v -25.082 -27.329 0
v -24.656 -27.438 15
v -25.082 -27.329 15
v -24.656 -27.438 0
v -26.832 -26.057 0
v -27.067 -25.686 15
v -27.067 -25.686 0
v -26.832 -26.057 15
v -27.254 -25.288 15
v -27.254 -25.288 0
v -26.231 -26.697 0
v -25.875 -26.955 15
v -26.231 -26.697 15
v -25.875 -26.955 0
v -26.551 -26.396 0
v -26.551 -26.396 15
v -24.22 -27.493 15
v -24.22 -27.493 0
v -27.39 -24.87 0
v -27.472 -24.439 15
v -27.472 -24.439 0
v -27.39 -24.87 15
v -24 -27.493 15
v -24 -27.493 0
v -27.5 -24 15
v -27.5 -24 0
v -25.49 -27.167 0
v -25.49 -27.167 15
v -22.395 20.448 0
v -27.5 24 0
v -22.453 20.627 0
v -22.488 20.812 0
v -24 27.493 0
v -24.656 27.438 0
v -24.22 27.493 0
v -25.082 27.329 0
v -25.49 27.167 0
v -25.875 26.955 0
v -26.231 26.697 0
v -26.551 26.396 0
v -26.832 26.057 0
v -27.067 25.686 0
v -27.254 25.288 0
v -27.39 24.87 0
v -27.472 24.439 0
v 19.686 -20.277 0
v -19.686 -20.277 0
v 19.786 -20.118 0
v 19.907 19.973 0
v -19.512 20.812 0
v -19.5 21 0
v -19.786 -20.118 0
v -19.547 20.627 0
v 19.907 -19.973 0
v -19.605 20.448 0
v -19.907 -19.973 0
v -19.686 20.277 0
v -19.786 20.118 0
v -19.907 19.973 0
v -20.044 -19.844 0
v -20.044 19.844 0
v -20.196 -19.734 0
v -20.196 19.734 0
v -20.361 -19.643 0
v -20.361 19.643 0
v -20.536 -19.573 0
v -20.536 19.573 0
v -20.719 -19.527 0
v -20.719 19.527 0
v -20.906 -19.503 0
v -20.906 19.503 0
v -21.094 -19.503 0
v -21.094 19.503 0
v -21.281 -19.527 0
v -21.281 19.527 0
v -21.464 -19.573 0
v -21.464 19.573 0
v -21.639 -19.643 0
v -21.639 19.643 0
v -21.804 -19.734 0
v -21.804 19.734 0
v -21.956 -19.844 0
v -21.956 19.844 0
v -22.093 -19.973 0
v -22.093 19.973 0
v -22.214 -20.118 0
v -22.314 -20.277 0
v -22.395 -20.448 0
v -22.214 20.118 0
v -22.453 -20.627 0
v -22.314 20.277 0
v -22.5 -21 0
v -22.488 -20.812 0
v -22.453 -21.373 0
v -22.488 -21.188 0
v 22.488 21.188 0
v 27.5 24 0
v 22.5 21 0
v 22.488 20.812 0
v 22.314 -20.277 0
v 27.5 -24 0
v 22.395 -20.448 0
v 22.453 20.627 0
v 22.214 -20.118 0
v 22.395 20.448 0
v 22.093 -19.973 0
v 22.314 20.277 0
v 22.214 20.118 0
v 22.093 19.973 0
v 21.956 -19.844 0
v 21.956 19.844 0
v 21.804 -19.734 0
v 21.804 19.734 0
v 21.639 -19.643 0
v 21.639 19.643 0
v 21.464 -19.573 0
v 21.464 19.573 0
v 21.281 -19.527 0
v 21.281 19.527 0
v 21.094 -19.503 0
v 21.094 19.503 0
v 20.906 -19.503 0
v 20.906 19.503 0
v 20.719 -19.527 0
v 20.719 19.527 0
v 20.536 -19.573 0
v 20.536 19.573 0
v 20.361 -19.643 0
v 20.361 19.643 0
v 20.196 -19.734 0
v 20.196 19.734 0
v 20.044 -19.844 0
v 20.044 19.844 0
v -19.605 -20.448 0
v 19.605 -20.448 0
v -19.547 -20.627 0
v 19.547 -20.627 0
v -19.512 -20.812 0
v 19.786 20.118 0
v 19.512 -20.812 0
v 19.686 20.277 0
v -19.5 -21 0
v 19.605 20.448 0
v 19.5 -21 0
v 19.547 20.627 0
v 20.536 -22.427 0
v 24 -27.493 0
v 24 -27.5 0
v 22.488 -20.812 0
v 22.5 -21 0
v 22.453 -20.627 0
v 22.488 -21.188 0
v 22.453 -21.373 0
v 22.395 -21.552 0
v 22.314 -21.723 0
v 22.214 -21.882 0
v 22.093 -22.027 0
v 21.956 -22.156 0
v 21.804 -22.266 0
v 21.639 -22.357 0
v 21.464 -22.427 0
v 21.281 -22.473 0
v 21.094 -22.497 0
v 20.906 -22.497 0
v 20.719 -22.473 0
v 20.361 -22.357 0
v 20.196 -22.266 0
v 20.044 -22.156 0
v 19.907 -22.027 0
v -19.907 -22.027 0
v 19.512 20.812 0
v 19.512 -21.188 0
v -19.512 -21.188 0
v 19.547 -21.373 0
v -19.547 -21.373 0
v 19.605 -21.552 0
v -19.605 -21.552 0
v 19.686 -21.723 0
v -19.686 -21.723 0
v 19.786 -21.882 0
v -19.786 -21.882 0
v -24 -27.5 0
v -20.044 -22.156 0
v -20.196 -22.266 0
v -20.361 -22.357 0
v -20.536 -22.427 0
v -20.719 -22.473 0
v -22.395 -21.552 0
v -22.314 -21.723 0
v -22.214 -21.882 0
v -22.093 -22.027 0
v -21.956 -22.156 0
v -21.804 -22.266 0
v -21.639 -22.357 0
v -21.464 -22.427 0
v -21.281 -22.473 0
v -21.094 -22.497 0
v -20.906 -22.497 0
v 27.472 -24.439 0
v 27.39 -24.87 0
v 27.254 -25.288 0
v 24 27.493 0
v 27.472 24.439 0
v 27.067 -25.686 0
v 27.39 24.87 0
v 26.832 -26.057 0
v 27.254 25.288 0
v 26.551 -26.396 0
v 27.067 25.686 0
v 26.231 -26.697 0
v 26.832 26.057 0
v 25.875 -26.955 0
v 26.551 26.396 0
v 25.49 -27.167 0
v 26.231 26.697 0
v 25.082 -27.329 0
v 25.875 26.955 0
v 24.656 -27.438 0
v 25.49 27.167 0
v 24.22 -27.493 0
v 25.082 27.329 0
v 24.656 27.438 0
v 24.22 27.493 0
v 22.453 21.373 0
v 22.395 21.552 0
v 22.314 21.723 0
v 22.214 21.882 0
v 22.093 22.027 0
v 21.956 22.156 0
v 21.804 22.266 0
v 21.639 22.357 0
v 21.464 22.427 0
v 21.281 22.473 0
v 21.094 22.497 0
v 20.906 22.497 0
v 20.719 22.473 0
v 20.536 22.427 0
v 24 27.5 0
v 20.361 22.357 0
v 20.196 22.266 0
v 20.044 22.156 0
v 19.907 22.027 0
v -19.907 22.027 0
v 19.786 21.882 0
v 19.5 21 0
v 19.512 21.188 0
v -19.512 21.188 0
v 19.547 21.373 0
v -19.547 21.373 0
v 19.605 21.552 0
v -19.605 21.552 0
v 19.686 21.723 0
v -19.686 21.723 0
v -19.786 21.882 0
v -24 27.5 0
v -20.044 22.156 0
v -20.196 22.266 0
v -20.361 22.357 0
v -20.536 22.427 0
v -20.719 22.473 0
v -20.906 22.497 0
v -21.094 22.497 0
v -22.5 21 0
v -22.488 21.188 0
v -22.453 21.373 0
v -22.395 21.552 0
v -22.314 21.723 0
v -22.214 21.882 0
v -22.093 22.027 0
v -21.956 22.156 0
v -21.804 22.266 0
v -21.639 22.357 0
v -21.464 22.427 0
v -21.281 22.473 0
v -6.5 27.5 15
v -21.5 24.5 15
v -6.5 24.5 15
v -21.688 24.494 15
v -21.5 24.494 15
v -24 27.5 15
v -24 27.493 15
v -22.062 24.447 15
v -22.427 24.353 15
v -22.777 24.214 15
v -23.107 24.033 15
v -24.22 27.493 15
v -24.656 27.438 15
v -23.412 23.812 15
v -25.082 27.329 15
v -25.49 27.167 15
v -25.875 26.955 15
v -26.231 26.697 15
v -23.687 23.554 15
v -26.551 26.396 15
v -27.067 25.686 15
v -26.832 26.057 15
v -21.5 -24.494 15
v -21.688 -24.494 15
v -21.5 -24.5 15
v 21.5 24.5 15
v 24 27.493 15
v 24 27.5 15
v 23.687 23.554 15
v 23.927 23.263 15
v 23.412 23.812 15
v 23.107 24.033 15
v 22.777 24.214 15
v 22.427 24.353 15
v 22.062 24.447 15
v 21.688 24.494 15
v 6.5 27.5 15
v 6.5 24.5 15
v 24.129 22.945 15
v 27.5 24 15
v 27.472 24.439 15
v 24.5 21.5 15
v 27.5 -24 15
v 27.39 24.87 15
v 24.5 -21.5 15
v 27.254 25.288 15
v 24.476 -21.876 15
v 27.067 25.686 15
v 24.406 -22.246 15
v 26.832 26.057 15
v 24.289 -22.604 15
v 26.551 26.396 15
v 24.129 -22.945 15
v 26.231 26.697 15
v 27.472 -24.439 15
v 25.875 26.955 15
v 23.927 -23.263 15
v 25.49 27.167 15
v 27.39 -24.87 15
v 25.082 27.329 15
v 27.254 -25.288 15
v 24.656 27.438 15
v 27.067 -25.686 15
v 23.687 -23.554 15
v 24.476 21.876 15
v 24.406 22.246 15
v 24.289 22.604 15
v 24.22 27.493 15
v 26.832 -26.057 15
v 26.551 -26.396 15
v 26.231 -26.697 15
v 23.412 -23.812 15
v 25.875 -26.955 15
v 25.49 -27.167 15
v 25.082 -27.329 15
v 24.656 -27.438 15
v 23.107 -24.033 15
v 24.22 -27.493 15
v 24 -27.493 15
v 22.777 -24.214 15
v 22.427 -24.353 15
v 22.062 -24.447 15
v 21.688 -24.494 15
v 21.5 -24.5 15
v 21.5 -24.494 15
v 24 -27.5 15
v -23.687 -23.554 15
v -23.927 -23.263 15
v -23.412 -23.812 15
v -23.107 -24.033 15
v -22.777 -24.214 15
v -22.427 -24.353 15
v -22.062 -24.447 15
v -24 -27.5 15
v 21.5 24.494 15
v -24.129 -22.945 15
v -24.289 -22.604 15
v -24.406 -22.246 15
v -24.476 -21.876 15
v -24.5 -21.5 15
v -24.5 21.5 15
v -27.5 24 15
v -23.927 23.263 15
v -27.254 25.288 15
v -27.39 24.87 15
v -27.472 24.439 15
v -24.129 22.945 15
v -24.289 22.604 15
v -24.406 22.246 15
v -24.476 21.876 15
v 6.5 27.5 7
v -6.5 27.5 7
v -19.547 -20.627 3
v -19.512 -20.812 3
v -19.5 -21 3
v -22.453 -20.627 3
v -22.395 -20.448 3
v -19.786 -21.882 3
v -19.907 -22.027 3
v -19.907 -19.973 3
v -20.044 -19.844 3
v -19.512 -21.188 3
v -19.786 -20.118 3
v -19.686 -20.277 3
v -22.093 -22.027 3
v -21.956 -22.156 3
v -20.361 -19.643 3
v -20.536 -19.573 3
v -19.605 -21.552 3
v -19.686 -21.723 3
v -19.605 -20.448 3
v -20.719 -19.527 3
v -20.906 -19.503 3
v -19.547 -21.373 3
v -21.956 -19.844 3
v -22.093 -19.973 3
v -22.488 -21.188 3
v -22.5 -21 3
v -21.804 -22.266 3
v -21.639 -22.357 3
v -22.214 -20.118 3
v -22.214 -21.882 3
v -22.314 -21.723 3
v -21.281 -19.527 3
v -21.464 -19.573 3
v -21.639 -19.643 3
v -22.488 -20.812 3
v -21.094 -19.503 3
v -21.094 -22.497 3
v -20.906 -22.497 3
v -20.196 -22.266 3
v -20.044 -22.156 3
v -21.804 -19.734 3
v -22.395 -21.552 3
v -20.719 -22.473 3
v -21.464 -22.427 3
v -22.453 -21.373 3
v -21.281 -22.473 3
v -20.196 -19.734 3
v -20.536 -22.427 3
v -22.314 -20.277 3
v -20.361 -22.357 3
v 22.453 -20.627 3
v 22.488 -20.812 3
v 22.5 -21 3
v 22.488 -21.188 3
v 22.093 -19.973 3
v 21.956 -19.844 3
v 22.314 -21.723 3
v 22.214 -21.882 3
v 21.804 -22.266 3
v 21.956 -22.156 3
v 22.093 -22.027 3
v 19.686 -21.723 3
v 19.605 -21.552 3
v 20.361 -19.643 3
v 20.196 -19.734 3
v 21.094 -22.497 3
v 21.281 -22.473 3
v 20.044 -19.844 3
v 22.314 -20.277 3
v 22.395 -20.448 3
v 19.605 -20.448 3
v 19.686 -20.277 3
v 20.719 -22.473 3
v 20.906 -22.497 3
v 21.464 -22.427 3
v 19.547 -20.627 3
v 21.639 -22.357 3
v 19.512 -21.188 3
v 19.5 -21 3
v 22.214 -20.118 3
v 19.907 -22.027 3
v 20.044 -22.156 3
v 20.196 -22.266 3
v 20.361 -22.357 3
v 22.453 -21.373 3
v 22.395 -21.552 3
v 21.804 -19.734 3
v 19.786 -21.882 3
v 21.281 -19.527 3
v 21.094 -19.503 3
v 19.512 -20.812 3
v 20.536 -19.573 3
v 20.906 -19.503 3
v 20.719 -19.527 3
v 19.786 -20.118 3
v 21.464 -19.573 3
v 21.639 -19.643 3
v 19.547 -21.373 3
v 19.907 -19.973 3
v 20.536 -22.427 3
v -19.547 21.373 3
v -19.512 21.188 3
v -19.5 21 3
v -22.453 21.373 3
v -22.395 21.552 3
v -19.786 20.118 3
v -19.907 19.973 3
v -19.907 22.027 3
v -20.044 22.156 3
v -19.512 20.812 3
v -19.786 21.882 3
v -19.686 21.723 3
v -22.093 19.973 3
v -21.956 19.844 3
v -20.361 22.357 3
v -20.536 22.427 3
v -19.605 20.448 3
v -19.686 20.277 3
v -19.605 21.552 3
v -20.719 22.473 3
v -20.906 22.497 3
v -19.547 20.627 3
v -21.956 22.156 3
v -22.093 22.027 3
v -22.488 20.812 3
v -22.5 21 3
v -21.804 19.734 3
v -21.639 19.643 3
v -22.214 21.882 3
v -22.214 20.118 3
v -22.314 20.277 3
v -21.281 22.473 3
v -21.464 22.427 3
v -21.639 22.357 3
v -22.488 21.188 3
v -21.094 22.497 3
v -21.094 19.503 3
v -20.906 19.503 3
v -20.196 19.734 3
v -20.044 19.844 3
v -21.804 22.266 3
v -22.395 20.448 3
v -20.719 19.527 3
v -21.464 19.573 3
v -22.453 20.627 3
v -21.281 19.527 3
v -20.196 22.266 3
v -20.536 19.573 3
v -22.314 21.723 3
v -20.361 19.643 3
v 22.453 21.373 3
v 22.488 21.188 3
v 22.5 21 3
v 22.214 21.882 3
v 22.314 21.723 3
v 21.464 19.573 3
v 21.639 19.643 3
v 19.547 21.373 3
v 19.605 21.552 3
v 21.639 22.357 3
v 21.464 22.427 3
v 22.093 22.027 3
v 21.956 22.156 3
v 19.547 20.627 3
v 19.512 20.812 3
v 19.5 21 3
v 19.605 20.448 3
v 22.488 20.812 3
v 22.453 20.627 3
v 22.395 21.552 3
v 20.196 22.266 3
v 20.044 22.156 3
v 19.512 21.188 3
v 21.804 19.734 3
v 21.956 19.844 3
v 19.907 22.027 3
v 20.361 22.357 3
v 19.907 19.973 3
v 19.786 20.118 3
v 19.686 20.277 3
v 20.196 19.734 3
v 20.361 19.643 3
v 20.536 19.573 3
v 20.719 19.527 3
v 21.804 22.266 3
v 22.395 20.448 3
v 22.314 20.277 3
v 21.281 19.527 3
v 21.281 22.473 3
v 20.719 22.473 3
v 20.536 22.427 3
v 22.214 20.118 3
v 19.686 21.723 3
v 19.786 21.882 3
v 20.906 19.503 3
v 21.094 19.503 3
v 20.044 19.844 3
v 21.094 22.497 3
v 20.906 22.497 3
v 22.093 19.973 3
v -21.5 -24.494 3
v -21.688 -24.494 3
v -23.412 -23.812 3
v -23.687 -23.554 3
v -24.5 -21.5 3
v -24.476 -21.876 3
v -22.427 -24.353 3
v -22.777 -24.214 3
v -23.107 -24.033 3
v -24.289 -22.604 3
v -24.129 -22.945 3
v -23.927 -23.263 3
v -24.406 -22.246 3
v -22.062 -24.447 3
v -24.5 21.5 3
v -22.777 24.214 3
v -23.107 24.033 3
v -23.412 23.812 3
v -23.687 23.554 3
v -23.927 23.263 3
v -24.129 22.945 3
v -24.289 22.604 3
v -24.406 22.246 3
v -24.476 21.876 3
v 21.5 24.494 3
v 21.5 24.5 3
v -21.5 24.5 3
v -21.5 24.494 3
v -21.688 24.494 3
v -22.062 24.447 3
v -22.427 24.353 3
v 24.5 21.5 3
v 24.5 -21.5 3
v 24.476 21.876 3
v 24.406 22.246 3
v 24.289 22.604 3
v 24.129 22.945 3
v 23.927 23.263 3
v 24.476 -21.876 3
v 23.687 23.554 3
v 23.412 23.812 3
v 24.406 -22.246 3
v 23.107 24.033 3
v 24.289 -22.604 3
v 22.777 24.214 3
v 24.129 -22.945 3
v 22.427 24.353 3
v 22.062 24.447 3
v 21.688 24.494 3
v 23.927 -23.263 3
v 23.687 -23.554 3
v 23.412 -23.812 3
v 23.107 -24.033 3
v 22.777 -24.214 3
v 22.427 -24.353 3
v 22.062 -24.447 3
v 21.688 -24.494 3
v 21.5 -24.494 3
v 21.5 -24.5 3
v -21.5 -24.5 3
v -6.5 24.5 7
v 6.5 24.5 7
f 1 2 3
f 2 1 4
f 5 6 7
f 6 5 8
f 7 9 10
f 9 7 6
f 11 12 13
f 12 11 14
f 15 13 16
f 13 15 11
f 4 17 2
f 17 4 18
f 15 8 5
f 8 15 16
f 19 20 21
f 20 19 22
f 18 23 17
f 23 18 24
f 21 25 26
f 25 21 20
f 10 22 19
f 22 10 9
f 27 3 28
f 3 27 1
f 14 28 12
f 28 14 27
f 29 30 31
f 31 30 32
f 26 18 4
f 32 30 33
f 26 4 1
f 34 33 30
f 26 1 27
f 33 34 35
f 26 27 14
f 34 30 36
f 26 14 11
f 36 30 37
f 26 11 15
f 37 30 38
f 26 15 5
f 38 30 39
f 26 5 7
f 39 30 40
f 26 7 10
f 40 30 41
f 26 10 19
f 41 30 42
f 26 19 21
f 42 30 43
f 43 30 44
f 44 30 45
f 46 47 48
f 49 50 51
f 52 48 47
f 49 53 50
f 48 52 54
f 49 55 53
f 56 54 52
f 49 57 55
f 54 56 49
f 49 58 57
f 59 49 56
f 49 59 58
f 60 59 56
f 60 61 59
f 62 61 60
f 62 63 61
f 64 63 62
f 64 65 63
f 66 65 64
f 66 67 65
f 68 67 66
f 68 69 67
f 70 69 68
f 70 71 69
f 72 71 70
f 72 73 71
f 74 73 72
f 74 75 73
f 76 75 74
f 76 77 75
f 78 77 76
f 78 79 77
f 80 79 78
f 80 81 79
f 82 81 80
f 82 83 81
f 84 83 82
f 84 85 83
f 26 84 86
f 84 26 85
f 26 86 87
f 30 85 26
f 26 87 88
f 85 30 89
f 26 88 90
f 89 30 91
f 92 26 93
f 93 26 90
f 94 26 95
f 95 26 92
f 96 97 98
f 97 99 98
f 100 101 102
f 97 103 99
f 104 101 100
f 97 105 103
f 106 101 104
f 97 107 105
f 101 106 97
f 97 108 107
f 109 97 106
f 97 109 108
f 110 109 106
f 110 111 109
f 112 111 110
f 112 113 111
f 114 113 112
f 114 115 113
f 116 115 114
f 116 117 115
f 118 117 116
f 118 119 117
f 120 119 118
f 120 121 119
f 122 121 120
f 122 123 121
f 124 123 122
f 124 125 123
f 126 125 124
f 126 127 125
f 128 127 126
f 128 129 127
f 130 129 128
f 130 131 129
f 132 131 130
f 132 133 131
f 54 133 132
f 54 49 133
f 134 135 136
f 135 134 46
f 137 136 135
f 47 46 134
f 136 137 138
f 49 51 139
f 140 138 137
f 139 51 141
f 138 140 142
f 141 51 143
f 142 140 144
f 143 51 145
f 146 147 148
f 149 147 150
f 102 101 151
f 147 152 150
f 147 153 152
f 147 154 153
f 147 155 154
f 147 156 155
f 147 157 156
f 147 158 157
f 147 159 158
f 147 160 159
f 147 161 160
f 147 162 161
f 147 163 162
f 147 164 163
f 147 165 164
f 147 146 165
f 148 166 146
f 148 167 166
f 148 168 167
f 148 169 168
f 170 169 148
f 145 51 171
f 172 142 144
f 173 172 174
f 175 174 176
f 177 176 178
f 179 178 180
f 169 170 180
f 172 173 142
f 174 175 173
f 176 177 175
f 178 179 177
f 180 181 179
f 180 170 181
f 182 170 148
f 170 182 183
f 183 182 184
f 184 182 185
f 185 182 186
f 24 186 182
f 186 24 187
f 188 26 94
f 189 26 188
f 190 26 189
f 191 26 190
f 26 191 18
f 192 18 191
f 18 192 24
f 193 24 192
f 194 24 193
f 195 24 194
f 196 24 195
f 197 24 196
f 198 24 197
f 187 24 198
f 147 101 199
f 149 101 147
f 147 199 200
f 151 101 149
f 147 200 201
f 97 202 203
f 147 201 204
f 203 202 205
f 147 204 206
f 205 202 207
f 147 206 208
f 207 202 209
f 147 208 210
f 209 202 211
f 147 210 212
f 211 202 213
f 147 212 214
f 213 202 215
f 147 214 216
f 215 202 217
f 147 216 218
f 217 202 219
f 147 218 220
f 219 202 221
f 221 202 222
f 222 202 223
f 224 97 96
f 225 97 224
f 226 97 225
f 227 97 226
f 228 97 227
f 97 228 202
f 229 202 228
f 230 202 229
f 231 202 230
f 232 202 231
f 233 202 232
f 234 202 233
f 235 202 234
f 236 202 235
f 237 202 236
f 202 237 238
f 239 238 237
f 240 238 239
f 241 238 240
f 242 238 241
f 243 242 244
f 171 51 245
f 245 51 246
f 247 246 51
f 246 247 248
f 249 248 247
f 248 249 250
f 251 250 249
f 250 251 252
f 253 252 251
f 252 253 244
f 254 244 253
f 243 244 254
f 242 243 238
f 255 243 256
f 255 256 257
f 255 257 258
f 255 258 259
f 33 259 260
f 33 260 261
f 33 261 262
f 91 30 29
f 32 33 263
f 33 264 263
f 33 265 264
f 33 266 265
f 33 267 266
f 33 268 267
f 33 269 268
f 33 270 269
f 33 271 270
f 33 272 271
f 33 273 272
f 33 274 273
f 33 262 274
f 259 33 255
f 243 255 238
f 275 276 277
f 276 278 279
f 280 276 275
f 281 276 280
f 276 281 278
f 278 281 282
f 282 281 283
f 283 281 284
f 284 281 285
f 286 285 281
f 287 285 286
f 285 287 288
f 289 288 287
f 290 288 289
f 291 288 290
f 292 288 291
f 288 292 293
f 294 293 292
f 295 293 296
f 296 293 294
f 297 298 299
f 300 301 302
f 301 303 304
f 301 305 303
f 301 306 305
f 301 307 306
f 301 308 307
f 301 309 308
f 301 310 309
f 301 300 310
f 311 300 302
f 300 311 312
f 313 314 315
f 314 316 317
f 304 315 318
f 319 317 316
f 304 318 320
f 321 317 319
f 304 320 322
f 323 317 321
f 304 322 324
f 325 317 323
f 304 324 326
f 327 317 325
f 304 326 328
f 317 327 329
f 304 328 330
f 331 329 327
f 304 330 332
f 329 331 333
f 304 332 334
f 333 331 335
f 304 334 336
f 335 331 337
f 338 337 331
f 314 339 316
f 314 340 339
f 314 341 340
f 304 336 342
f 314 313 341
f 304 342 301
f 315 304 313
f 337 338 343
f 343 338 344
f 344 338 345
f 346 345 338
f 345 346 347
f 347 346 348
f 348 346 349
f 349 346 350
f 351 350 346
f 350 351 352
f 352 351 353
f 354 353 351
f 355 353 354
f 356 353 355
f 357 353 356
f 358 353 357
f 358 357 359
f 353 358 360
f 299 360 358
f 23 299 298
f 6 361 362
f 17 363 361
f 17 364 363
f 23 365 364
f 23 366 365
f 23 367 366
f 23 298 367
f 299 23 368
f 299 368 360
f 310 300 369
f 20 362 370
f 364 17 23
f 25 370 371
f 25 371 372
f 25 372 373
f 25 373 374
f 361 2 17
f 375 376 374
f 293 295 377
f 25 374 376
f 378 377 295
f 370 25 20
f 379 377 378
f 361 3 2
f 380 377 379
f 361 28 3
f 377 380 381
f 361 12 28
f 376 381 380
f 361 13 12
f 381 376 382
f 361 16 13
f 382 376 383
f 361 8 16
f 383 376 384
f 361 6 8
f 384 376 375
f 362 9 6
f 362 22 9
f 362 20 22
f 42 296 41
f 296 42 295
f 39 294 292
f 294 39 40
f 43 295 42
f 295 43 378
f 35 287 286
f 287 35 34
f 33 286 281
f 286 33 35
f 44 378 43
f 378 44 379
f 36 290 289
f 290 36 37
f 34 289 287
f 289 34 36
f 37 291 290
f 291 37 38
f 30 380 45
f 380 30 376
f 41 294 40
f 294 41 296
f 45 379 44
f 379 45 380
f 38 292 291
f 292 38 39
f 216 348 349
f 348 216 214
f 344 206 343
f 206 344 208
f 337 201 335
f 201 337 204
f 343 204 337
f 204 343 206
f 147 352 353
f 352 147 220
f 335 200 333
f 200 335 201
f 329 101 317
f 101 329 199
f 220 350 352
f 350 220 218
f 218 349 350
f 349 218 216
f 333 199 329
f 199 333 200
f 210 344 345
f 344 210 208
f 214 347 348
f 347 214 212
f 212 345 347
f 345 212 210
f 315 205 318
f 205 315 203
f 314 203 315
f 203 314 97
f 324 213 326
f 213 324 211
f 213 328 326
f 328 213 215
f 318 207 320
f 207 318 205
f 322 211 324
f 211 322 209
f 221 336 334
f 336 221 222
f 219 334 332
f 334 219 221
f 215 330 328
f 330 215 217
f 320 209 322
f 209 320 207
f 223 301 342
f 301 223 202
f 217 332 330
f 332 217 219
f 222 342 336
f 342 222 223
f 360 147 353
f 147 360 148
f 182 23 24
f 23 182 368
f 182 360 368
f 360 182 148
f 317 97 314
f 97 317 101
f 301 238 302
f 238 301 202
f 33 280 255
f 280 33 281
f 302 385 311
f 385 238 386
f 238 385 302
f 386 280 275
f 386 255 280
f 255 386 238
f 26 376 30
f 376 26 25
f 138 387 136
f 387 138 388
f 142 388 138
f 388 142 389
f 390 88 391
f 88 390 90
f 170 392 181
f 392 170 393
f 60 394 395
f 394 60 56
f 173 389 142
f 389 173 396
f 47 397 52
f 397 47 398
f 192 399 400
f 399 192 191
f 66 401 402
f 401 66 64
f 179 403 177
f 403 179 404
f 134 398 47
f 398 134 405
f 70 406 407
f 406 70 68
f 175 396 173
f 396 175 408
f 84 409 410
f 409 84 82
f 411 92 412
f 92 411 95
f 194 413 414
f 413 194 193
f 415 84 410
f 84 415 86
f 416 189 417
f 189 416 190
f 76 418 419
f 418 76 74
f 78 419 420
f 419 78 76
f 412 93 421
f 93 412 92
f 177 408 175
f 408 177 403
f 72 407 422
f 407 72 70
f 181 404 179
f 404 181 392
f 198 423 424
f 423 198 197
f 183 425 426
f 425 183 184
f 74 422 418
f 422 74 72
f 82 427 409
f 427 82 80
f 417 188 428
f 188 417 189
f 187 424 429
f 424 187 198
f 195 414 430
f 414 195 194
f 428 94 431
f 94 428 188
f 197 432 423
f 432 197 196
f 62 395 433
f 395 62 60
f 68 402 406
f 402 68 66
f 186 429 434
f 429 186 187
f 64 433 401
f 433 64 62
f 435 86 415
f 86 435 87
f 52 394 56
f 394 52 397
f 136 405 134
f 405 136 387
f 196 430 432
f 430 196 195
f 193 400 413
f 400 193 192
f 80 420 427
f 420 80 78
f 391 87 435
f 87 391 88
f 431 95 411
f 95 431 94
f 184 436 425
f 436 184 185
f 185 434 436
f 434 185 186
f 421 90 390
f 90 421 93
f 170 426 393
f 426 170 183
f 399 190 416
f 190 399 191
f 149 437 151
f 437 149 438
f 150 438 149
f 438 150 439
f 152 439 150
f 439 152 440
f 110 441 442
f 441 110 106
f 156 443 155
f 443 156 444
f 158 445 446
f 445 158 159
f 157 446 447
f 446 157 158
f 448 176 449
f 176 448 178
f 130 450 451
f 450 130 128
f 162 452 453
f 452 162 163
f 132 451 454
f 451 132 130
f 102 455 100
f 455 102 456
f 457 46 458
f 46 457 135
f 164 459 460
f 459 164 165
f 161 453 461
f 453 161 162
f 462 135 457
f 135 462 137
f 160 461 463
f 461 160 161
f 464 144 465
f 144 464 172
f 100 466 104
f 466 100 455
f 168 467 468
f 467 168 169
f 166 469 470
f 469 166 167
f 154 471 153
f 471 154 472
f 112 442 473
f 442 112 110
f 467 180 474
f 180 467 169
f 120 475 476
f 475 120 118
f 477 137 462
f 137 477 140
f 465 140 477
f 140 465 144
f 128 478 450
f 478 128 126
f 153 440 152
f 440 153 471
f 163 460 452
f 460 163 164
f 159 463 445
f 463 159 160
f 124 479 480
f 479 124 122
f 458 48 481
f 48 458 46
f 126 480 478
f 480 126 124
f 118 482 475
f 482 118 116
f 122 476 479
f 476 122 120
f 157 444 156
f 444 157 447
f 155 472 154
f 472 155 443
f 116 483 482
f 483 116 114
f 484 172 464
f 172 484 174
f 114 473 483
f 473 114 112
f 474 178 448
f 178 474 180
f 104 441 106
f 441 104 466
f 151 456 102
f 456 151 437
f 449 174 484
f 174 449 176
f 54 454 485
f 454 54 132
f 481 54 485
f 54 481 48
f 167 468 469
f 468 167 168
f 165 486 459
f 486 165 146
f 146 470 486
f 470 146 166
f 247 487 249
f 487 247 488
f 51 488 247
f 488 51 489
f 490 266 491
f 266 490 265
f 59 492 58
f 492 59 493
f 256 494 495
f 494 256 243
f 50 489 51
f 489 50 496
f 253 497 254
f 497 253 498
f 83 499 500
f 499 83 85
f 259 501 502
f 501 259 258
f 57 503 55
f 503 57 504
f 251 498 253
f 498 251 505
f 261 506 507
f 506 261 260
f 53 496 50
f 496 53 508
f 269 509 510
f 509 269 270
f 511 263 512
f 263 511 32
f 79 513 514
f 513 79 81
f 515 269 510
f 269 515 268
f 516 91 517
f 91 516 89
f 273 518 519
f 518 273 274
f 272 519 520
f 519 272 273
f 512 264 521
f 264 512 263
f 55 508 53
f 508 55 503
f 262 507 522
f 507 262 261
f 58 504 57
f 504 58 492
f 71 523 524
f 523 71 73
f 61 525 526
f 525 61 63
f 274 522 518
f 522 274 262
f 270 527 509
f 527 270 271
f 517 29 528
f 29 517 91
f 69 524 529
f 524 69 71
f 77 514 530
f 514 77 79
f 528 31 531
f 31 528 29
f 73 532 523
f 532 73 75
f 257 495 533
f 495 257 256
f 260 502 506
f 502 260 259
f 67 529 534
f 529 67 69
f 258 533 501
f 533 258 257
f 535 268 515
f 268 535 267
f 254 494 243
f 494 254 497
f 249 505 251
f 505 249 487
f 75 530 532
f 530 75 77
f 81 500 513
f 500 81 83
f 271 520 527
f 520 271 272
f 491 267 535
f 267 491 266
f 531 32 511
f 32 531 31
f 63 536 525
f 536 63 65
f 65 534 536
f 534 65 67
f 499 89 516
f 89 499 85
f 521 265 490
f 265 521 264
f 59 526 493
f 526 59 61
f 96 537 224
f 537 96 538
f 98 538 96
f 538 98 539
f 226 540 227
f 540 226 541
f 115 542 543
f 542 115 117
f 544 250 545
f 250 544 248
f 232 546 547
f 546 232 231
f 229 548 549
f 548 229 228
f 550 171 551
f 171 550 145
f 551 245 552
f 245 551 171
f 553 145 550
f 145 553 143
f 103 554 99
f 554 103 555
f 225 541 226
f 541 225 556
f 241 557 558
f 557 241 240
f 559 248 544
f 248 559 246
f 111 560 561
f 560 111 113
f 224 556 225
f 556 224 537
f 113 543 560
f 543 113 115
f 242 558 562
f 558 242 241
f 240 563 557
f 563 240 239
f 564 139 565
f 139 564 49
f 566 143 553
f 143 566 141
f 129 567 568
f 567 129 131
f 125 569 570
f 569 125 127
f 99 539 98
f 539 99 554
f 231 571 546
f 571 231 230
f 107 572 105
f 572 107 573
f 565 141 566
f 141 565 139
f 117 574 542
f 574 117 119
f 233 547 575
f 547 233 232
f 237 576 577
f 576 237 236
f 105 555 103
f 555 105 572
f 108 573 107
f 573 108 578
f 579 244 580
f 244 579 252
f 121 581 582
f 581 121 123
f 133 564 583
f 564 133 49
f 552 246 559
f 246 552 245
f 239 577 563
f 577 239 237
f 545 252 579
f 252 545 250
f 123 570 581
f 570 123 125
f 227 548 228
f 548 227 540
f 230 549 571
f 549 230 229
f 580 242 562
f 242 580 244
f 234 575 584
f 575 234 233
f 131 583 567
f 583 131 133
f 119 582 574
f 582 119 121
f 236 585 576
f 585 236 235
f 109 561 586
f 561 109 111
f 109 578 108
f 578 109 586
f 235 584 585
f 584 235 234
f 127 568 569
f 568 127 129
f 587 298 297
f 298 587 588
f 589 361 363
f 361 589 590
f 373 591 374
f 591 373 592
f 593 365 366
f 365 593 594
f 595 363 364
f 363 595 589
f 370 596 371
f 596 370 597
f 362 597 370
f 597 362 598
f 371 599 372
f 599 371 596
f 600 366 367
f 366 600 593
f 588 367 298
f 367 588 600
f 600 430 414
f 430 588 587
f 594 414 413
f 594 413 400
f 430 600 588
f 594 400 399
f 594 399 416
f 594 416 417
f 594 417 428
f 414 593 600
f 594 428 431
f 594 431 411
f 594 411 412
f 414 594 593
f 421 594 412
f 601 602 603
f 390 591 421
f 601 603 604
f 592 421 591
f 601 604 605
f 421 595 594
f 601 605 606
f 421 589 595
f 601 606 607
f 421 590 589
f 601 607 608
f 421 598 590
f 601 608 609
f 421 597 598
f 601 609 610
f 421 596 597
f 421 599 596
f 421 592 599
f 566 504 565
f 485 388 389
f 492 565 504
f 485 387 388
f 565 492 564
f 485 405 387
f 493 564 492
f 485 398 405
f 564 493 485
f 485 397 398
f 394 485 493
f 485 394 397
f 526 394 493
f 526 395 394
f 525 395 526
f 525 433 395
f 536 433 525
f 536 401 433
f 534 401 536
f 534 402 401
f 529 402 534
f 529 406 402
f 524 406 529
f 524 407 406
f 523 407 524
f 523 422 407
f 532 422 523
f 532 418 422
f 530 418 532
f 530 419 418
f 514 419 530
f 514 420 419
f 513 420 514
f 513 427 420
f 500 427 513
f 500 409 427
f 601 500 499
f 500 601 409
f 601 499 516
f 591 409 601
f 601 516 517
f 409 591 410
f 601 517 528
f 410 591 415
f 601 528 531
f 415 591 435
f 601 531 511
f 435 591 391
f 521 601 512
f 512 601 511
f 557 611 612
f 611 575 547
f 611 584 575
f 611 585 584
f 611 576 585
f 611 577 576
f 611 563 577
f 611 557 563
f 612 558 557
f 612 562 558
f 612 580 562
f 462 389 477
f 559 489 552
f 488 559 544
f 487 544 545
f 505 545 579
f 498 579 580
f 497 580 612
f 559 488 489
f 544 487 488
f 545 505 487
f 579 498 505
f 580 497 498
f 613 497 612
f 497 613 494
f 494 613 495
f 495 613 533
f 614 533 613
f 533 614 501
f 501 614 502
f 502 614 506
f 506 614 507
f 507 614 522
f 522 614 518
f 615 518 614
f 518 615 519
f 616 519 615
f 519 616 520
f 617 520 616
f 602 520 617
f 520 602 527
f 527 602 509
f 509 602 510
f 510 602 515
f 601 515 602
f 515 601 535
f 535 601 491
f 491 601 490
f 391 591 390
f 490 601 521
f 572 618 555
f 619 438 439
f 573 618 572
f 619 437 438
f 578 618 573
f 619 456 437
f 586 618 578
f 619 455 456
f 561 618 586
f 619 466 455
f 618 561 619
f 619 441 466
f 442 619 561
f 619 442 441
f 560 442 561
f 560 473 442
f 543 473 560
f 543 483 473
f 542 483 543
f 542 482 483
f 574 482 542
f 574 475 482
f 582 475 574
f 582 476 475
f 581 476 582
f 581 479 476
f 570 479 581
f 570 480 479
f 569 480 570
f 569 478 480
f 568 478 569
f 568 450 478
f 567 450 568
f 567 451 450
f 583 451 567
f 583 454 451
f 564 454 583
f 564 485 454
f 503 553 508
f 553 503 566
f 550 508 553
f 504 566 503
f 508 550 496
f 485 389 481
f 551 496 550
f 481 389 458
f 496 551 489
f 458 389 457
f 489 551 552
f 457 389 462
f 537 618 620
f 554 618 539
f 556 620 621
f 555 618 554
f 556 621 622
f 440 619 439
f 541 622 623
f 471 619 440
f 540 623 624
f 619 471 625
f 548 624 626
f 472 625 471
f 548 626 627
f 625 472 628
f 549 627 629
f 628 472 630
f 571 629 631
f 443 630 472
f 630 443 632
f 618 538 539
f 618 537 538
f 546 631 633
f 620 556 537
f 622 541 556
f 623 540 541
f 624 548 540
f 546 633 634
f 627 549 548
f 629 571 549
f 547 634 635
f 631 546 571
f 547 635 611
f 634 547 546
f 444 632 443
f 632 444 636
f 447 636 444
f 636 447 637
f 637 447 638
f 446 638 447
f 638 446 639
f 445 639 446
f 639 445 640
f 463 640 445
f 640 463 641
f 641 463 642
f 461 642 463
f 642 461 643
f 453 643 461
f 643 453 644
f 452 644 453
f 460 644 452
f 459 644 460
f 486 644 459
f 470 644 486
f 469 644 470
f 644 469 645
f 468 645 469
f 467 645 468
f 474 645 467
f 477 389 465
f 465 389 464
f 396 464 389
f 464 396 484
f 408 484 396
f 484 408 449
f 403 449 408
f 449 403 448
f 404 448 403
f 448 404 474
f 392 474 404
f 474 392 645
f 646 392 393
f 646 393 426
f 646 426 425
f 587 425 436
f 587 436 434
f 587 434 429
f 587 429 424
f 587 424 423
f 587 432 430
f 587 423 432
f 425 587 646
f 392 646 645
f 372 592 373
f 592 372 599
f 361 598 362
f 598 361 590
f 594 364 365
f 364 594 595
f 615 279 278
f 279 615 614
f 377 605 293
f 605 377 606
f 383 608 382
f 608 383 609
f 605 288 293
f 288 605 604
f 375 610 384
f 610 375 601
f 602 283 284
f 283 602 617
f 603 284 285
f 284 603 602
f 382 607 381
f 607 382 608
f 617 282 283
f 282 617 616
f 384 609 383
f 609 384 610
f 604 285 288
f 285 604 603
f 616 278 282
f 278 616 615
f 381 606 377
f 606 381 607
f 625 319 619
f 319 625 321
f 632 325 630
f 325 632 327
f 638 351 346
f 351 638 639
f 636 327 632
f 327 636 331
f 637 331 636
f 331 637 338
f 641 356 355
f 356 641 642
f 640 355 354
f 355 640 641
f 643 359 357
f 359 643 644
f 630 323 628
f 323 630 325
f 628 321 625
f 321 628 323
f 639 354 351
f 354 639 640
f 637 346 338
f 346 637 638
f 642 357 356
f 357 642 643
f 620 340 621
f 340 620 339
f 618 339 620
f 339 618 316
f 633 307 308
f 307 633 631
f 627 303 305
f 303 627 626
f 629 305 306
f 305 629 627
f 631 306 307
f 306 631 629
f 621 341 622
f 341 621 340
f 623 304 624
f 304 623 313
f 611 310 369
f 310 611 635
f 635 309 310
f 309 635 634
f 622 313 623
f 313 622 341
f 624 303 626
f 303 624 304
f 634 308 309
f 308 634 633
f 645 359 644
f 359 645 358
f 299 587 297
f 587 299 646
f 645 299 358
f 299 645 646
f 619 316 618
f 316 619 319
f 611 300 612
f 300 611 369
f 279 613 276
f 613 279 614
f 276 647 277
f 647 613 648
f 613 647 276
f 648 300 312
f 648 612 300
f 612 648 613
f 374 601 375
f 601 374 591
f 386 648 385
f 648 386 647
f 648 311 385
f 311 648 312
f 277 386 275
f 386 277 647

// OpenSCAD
$fn = 50;
ww=3;
int_radius = 3.5;
h = 15;
w = 49;

module rounded_cube(w,h,r) {
for(i = [-1,1]) for(j = [-1,1])
translate([(w/2-r)*i, (w/2-r)*j, 0]) cylinder(r = r, h = h, center = true);
cube([w-r,w-r,h],center = true);
for(i = [-1,1]) for(j = [0,1])
rotate([0,0,90*j]) translate([0,(w-r)/2*i,0]) cube([w-2*r,r,h], center = true);
}

module TinyISP() {
translate([0,0,1])
difference() {
union() {
color("green")
rounded_cube(48.5, 2, 3);
color("grey")
translate([0,17/2 + 15,11/2  + 1]) cube([13,17,11], center = true);
}
for(i = [-1,1]) for(j = [-1,1])
translate([42/2*j, 42/2*i, 0]) cylinder(r = 3/2, h = h+2, center = true);
}
}

module TinyISPBox() {
translate([0,0,h/2])
difference() {
union() {
rounded_cube(w + ww*2, h, 7/2);
}
union() {
for(i = [-1,1]) for(j = [-1,1])
translate([42/2*j, 42/2*i, 0]) cylinder(r = 3/2, h = h+2, center = true);
translate([0,0,ww]) rounded_cube(w,h,3);
translate([0,0,-h/2 + ww + 2]) TinyISP();
}
}
}

TinyISPBox();
//translate([0,0,ww + 2]) TinyISP();

//translate([60,0,0]) TinyISP();
